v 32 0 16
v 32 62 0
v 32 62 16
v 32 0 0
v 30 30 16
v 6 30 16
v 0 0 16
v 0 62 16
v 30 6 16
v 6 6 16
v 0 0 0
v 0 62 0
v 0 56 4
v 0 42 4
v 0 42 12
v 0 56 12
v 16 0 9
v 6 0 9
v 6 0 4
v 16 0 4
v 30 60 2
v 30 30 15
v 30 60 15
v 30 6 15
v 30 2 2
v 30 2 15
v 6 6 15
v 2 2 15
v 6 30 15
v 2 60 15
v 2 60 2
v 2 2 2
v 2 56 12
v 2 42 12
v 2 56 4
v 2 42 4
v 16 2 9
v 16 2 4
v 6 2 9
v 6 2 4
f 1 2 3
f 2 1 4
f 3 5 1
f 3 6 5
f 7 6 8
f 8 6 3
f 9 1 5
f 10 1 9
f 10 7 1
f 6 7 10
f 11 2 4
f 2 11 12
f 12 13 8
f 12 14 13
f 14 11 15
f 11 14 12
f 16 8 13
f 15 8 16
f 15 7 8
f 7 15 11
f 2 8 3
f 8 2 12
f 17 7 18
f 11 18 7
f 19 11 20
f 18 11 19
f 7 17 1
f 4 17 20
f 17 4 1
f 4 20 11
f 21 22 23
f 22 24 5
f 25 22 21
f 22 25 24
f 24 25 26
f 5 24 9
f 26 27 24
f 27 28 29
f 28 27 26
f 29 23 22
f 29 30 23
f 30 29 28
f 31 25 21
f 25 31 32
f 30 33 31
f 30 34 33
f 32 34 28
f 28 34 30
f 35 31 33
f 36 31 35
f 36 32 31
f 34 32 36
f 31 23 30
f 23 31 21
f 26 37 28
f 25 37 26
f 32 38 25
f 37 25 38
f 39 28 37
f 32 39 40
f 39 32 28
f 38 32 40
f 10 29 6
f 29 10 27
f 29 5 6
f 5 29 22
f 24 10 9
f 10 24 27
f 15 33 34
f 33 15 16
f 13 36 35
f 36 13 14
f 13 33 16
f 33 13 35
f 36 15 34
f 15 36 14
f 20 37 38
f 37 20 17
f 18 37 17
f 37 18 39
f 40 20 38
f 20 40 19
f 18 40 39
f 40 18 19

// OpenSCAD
// Clip Thermometer Enclosure
// Holds: ESP32-C3 SuperMini + MAX6675 + SSD1306 OLED
// Units: mm

// ── Parameters ──────────────────────────────────────────
wall = 2.0;           // wall thickness
inner_w = 28;          // PCB width (SuperMini)
inner_l = 50;          // PCB length
inner_h = 12;          // PCB height + clearance
oled_w = 27;           // OLED board width
oled_h = 27;           // OLED height
oled_x = 0;            // OLED flush left
oled_y = 0;            // OLED flush top

// ── Box ─────────────────────────────────────────────────
module box() {
    difference() {
        // Outer shell
        cube([inner_w + wall*2, inner_l + wall*2 + 8, inner_h + wall*2]);
        
        // Hollow inside
        translate([wall, wall, wall])
            cube([inner_w, inner_l + 8, inner_h + 1]);
        
        // OLED cutout (on the top face / lid area)
        translate([wall + 4, wall + 4, inner_h + wall - 0.1])
            cube([24, 24, wall + 2]);
        
        // Thermocouple connector cutout (side)
        translate([-1, wall + inner_l - 10, wall + 2])
            cube([wall + 2, 14, 8]);
        
        // USB cutout (opposite side)
        translate([wall + 4, -1, wall + 2])
            cube([10, wall + 2, 5]);
    }
}

// ── Lid ─────────────────────────────────────────────────
module lid() {
    difference() {
        cube([inner_w + wall*2, inner_l + wall*2 + 8, wall]);
        
        // OLED window
        translate([wall + 2, wall + 2, -0.1])
            cube([24, 24, wall + 2]);
    }
}

// ── Clip arm (holds thermocouple bead) ──────────────────
module probe_clip(wire_dia = 0.5, bead_dia = 2.0) {
    // A simple clamp that holds the thermocouple bead against the wire
    
    difference() {
        // Main body
        hull() {
            translate([0, 0, 0]) cylinder(r=4, h=6, $fn=32);
            translate([15, 0, 0]) cylinder(r=4, h=6, $fn=32);
        }
        
        // Wire groove (bottom)
        translate([2, -wire_dia/2 - 0.2, -0.1])
            cube([11, wire_dia + 0.4, 2.5]);
        
        // Probe channel (runs parallel)
        translate([2, -1.5, 1.5])
            rotate([0, 90, 0])
            cylinder(r=bead_dia/2 + 0.3, h=11, $fn=24);
        
        // Bead pocket (where bead touches wire)
        translate([12, 0, 3])
            sphere(r=bead_dia/2 + 0.5, $fn=24);
    }
}

// ── Render ───────────────────────────────────────────────
// Comment/uncomment as needed:

// Full enclosure
box();

// Lid (translate to view)
// translate([0, 0, inner_h + wall*2 + 5]) lid();

// Probe clip
// translate([40, 0, 0]) probe_clip();
